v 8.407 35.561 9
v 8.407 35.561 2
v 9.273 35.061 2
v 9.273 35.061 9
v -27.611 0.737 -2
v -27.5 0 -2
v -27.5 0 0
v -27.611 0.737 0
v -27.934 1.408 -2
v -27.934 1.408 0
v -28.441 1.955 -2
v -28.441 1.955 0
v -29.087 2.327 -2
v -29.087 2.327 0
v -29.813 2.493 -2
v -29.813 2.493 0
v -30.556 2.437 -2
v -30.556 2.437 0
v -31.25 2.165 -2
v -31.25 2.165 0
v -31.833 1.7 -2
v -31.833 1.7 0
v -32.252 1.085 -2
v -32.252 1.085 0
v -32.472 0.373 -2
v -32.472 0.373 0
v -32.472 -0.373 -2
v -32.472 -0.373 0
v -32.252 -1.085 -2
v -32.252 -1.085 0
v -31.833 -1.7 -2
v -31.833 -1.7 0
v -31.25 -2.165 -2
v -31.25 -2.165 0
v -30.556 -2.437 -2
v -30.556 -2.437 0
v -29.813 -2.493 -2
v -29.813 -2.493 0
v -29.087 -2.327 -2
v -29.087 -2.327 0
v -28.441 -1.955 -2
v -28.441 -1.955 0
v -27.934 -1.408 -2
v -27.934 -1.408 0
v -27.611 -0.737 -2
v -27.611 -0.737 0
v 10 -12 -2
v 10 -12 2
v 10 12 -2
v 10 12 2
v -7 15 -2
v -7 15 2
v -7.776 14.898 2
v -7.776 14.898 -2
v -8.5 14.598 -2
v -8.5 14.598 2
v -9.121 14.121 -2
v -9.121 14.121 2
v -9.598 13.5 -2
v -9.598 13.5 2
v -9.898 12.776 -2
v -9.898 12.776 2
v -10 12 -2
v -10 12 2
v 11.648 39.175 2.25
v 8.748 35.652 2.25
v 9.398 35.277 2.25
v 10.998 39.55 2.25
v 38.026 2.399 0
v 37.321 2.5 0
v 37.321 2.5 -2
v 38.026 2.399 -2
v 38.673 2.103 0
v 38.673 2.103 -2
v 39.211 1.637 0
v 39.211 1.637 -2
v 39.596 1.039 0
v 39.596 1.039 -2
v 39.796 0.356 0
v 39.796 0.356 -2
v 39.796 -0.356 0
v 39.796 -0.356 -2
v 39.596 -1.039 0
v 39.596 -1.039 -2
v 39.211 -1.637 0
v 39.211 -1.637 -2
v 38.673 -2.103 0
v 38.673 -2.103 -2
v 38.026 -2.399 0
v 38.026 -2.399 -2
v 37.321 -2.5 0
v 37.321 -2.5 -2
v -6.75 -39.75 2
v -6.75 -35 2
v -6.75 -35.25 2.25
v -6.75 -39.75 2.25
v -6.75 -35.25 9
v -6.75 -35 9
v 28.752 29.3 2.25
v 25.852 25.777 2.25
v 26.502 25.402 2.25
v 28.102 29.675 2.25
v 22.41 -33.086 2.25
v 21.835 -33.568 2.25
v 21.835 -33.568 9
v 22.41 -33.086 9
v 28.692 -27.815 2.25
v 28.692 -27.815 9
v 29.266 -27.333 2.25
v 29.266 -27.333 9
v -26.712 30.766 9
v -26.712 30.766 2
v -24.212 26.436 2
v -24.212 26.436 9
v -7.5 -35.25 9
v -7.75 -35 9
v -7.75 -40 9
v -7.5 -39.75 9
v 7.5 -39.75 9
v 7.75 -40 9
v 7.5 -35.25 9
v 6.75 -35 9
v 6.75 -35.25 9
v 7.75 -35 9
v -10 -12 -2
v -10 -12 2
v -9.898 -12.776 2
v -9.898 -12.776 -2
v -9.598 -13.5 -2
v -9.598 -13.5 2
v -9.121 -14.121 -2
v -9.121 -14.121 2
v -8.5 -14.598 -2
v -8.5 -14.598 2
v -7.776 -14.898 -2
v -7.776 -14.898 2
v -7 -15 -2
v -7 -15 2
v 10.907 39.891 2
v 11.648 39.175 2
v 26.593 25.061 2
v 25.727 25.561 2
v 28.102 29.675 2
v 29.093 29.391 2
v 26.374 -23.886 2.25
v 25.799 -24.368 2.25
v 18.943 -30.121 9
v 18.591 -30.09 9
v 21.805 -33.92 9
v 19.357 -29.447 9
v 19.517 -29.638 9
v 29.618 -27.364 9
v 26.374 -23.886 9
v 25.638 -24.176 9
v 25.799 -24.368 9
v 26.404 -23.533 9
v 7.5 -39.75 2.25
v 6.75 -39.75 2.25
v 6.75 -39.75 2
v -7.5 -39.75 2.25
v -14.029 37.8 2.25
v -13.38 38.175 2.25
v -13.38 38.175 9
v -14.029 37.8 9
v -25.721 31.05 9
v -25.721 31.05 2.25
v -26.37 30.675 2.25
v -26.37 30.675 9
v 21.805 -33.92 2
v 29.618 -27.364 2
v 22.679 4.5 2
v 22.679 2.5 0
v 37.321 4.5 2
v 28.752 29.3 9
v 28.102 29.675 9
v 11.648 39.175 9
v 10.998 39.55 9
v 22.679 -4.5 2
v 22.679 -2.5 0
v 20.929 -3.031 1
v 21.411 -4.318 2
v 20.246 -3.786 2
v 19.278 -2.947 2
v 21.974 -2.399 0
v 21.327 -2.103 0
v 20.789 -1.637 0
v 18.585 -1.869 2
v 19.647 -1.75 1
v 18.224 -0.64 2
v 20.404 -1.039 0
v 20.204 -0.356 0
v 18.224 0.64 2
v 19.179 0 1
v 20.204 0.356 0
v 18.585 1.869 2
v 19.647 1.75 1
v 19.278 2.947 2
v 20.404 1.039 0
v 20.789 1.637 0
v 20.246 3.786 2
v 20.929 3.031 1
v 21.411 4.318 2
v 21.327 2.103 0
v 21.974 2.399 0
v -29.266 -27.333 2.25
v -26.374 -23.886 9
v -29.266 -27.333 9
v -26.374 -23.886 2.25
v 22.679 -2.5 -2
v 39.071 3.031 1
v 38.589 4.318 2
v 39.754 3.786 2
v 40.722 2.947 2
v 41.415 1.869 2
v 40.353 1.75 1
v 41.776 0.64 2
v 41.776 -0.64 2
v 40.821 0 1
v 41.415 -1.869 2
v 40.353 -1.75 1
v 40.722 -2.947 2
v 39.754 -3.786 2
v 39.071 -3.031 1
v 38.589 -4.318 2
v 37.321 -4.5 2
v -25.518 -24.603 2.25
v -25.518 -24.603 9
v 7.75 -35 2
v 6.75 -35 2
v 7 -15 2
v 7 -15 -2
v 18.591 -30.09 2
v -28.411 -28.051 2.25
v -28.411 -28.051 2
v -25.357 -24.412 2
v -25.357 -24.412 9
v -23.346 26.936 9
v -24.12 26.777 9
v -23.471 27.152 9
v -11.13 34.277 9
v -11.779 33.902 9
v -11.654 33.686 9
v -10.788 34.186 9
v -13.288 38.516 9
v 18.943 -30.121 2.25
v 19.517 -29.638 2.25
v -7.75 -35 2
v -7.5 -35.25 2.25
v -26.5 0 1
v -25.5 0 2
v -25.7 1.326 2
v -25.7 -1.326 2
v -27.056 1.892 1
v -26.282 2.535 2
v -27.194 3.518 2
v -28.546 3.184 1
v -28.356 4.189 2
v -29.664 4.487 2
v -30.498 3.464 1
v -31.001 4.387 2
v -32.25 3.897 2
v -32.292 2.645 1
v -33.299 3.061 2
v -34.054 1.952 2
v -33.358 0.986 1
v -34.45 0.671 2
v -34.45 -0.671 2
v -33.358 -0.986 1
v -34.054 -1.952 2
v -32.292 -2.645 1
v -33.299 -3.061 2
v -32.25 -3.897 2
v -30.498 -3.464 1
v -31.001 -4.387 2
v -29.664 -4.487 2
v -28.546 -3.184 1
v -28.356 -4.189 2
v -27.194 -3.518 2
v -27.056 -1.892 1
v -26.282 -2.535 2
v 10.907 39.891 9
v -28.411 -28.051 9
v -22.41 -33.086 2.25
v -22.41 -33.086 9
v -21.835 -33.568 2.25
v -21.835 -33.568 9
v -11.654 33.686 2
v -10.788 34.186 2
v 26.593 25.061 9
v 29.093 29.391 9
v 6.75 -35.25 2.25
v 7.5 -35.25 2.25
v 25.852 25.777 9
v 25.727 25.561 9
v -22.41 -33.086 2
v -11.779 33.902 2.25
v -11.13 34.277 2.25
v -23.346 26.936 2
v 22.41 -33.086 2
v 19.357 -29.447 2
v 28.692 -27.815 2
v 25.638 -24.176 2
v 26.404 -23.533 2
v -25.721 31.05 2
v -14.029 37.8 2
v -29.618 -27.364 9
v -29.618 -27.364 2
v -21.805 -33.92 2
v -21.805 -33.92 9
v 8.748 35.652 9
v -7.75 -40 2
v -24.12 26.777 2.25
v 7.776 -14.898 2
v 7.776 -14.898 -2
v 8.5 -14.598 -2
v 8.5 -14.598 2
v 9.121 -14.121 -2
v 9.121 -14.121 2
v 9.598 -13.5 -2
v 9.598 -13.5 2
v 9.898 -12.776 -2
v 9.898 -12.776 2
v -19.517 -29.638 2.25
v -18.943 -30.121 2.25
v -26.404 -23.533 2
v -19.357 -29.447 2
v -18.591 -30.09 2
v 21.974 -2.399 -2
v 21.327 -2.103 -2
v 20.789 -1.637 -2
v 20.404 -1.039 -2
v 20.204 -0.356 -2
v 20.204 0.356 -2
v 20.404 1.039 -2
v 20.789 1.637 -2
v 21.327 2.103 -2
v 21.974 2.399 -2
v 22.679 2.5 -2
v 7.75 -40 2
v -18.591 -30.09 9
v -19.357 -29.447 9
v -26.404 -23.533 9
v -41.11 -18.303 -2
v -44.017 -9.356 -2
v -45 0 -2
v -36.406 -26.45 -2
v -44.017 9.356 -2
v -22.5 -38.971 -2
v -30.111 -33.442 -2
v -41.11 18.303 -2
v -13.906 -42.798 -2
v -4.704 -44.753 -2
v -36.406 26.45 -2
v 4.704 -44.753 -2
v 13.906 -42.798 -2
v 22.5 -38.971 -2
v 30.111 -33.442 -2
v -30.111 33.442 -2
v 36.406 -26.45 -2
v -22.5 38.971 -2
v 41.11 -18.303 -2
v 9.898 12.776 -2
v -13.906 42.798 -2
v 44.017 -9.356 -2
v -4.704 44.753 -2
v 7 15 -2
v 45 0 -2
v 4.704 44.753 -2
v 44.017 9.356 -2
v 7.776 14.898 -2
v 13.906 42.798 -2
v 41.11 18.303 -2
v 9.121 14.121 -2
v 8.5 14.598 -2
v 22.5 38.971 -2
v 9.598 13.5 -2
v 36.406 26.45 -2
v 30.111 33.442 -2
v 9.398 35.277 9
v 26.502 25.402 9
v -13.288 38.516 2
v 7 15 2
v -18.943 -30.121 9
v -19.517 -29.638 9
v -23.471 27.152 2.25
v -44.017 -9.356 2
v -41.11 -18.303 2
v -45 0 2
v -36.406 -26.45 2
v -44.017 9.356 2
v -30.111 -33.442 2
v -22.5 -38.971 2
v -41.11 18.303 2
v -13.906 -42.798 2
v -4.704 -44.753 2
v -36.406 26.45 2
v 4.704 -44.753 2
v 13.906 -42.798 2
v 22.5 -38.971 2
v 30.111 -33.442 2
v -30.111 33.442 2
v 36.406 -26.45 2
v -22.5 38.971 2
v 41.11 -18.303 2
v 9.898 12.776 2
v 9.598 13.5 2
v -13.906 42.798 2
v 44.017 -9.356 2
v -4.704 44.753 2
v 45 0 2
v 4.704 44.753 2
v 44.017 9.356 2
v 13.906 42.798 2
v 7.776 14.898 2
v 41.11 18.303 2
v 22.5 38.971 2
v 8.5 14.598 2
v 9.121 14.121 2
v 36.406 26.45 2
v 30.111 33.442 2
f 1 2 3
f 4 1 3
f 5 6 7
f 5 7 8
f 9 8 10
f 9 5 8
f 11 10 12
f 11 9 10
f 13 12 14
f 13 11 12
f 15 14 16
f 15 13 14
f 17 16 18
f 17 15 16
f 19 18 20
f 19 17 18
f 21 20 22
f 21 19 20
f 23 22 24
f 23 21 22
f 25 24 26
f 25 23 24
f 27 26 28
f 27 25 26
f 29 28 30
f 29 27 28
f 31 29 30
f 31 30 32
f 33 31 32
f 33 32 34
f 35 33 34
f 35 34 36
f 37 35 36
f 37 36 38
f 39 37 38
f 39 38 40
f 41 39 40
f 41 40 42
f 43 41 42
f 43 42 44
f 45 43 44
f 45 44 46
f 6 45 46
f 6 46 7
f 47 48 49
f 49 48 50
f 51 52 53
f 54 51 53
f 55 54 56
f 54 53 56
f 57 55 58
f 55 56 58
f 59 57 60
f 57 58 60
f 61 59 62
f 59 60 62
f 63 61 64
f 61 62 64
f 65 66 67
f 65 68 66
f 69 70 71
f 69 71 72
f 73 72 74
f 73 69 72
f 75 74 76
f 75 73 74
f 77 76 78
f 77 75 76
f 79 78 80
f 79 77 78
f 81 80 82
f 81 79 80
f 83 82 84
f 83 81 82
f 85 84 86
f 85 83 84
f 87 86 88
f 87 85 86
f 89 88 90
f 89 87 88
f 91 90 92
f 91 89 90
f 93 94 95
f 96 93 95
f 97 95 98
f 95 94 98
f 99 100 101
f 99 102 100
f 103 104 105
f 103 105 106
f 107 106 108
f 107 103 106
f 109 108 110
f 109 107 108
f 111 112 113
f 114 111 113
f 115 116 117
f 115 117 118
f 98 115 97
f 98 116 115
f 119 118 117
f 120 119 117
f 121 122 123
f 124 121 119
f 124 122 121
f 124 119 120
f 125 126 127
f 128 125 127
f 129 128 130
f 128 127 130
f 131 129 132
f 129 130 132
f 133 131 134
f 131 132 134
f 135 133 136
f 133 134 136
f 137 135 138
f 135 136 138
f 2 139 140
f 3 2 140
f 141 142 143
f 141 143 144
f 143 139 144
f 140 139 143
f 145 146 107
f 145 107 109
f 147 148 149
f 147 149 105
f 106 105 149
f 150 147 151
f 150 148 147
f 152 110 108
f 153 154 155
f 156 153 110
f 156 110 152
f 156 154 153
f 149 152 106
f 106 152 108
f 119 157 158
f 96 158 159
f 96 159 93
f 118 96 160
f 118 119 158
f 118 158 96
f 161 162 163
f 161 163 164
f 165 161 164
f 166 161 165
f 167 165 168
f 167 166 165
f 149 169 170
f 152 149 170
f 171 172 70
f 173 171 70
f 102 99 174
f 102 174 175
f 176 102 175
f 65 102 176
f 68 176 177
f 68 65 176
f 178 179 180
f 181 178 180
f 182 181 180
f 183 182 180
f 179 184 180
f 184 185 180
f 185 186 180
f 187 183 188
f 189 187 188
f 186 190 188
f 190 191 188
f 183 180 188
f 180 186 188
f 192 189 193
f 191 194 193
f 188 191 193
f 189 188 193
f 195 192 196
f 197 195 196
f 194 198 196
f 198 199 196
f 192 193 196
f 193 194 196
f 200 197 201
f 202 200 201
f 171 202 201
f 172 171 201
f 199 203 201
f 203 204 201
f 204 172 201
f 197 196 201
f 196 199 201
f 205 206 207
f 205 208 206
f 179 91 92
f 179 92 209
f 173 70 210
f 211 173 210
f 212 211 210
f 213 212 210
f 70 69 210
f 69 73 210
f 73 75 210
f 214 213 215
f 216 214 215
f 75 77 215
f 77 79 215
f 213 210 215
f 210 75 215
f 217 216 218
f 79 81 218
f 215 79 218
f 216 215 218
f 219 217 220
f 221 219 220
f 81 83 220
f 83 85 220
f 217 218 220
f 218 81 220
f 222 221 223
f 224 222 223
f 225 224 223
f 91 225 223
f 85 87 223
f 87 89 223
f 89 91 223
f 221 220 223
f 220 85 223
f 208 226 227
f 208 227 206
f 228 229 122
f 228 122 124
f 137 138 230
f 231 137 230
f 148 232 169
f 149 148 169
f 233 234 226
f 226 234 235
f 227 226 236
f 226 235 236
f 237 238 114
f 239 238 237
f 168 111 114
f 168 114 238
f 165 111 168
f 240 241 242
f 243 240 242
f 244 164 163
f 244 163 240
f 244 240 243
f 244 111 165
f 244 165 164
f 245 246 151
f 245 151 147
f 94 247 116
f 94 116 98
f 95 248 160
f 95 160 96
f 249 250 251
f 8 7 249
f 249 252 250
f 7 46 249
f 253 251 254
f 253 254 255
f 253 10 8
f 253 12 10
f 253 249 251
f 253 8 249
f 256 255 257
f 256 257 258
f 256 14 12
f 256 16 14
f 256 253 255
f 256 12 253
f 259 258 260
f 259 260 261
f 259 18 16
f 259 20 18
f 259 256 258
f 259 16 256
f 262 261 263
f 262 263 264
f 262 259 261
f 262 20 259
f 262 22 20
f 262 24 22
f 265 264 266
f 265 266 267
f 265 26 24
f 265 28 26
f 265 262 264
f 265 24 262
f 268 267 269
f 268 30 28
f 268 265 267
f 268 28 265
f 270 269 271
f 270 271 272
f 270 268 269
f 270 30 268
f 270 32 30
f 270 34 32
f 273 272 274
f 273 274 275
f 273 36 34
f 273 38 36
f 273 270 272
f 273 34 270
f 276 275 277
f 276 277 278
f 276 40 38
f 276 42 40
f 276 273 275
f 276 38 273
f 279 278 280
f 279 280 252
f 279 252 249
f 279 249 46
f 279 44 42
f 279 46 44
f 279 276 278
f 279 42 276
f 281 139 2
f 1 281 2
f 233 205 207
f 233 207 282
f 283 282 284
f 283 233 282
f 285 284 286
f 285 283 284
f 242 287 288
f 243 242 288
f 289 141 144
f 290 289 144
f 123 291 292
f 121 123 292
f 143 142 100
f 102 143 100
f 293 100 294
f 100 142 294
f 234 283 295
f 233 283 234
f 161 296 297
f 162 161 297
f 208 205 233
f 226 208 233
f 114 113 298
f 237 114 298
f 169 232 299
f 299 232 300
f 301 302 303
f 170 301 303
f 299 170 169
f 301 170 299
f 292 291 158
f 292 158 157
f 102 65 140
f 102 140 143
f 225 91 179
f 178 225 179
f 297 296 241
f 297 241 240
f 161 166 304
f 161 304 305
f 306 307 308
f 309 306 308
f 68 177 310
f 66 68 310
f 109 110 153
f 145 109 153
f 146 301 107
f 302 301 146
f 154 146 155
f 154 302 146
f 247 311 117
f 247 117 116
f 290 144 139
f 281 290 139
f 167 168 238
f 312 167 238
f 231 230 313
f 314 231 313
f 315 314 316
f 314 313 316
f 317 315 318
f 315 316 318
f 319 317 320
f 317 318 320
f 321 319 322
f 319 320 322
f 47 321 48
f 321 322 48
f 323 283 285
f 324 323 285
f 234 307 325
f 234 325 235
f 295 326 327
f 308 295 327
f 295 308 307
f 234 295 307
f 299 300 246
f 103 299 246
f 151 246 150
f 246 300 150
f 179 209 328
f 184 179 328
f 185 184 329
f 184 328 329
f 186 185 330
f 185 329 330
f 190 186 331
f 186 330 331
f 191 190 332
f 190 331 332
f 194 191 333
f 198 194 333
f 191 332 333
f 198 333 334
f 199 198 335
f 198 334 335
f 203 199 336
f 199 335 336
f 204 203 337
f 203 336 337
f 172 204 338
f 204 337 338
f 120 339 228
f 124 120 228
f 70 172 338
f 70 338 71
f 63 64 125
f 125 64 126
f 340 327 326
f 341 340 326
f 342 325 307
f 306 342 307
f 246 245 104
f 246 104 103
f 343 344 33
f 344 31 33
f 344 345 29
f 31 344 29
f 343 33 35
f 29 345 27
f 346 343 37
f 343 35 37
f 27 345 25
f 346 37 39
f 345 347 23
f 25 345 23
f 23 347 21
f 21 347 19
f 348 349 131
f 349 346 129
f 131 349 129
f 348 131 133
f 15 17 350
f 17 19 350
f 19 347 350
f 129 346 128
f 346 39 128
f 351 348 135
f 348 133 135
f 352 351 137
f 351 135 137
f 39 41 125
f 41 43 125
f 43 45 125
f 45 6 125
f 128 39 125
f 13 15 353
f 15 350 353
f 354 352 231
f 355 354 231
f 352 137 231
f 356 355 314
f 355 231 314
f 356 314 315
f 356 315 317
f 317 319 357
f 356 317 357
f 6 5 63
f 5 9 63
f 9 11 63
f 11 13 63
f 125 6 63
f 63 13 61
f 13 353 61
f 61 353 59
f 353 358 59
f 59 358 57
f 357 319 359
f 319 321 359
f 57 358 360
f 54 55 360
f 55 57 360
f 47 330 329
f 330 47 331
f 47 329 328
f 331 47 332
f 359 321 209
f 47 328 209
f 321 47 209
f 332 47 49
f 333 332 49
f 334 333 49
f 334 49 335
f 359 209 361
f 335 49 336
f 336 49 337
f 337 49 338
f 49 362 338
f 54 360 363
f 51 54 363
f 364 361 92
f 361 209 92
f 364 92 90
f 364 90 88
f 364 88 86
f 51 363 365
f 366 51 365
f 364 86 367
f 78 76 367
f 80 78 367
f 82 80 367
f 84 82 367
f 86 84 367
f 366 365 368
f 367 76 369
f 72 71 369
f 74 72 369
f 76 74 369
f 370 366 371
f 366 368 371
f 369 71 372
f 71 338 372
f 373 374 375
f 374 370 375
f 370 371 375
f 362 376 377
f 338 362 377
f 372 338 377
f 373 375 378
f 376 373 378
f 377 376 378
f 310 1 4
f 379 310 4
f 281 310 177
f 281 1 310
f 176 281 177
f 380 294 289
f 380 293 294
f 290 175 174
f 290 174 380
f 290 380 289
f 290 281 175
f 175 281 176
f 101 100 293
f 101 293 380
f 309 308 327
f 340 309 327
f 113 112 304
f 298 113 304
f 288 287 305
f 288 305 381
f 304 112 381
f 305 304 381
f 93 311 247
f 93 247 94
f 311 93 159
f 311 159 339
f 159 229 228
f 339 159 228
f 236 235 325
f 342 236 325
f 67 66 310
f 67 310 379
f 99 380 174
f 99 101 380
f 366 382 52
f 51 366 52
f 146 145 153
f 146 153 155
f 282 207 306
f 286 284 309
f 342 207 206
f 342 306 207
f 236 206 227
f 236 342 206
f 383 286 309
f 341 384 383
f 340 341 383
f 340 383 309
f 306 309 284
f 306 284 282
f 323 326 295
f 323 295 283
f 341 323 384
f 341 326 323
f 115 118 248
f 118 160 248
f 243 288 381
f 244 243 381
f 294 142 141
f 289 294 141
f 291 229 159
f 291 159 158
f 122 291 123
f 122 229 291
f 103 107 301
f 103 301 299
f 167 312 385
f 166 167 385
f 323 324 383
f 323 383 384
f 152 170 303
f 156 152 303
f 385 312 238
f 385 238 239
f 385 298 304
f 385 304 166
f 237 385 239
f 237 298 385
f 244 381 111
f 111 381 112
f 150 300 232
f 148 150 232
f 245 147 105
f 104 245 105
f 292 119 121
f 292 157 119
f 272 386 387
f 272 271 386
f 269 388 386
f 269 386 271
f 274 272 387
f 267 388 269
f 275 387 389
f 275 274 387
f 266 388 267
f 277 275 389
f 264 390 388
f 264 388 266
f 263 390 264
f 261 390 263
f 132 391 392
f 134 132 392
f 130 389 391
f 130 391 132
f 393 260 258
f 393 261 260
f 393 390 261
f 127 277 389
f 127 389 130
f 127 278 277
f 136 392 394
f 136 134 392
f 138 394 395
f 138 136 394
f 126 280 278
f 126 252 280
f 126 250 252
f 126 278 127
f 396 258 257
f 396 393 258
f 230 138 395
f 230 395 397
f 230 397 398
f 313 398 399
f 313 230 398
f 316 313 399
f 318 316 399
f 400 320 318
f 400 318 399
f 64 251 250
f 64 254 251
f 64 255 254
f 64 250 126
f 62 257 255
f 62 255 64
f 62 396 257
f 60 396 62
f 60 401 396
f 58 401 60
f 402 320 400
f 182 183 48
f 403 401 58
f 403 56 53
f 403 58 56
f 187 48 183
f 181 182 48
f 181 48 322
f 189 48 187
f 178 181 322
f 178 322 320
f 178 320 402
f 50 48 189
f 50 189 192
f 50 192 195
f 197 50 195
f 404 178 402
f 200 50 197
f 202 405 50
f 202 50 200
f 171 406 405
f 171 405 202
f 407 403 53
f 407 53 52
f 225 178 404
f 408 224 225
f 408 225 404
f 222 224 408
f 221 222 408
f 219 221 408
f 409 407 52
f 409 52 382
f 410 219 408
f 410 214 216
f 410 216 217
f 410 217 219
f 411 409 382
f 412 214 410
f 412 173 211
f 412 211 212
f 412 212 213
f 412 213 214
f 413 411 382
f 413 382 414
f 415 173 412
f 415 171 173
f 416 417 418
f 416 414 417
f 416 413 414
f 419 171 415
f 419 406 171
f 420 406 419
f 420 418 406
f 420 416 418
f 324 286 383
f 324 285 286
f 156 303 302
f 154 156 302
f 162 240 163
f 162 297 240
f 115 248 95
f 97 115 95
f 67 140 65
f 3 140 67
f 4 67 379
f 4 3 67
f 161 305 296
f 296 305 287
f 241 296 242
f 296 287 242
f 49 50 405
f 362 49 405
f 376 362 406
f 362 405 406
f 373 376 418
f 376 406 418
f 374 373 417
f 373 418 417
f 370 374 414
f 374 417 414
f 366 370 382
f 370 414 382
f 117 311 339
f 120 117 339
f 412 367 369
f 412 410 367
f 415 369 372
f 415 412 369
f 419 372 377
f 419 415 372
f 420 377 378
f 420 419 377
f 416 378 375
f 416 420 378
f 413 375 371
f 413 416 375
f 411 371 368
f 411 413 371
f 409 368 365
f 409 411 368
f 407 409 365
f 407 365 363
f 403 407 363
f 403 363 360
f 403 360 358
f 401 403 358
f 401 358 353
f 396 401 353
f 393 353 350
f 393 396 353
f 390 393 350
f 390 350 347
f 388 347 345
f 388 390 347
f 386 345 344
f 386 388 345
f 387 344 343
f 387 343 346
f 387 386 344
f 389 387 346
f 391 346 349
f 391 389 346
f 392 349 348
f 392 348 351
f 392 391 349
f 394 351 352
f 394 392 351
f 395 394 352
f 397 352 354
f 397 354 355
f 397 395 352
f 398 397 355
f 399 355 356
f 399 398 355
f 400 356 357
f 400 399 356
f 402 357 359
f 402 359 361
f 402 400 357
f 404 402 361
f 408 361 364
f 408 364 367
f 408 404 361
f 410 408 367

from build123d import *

# Parameters (mm, degrees)
F0_R      = 45
F0_R_2    = 2.5
F1_DEPTH  = 2
F2_SIZE2  = 2
F2_SIZE   = 2
F3_SIZE2  = 2
F3_SIZE   = 2
F9_DEPTH  = 7
F6_W      = 15.5
F6_H      = 5
F10_T     = -0.25
F10_2_T   = -0.25
F10_3_T   = -0.25
F10_4_T   = -0.25
F10_5_T   = -0.25
F11_W     = 13.5
F11_H     = 7
F12_DEPTH = 4.75
F13_W     = 19
F13_H     = 7
F14_DEPTH = 4.75
F15_W     = 8.2
F15_H     = 7
F16_DEPTH = 4.75
F17_W     = 13.5
F17_H     = 7
F18_DEPTH = 4.75
F19_W     = 7.8331888452
F19_H     = 7
F20_DEPTH = 4.75
F22_DEPTH = 4.001


with BuildPart() as f1:
    # F0 (on Top) → F1 (new body, symmetric)
    with BuildSketch(Plane.XY):
        Circle(F0_R)
        with Locations((-30, 0)):
            Circle(F0_R_2, mode=Mode.SUBTRACT)
        with BuildLine():
            ThreePointArc((22.6785261184, -2.5), (20.1785261184, 0), (22.6785261184, 2.5))
            Line((22.6785261184, 2.5), (37.3214738816, 2.5))
            ThreePointArc((37.3214738816, 2.5), (39.8214738816, 0), (37.3214738816, -2.5))
            Line((37.3214738816, -2.5), (22.6785261184, -2.5))
        make_face(mode=Mode.SUBTRACT)
    extrude(amount=F1_DEPTH, both=True)

    # F2
    f2_edges = [f1.edges().sort_by_distance(p)[0] for p in [
        (-32.5, 0, 2),
    ]]
    chamfer(f2_edges, length=F2_SIZE, length2=F2_SIZE2)

    # F3
    f3_edges = [f1.edges().sort_by_distance(p)[0] for p in [
        (20.178526, 0, 2),
    ]]
    chamfer(f3_edges, length=F3_SIZE, length2=F3_SIZE2)

    # F21 (on face) → F22 (cut, through all)
    with BuildSketch(Plane.XY.offset(2)):
        with BuildLine():
            Line((7, 15), (-7, 15))
            ThreePointArc((-7, 15), (-9.1213203436, 14.1213203436), (-10, 12))
            Line((-10, 12), (-10, -12))
            ThreePointArc((-10, -12), (-9.1213203436, -14.1213203436), (-7, -15))
            Line((-7, -15), (7, -15))
            ThreePointArc((7, -15), (9.1213203436, -14.1213203436), (10, -12))
            Line((10, -12), (10, 12))
            ThreePointArc((10, 12), (9.1213203436, 14.1213203436), (7, 15))
        make_face()
    extrude(amount=-F22_DEPTH, mode=Mode.SUBTRACT)


with BuildPart() as f9:
    # F4 (on face) → F9 (new body)
    with BuildSketch(Plane.XY.offset(2)):
        Polygon((26.5932667397, 25.0608891325), (29.0932667397, 29.3910161514), (10.9067332603, 39.8910161514), (8.4067332603, 35.5608891325), align=None)
    extrude(amount=F9_DEPTH)

    # F10#2
    f10_2_openings = [f9.faces().sort_by_distance(p)[0] for p in [
        (18.75, 32.475953, 9),
    ]]
    offset(amount=F10_2_T, openings=f10_2_openings)

    # F13 (on face) → F14 (cut, through all)
    with BuildSketch(Plane(origin=(17.5, 30.3108891325, 0), x_dir=(0.8660254038, -0.5, 0), z_dir=(-0.5, -0.8660254038, 0))):
        with Locations((0, 5.5)):
            Rectangle(F13_W, F13_H)
    extrude(amount=-F14_DEPTH, mode=Mode.SUBTRACT)


with BuildPart() as f9b:
    # F5 (on face) → F9, piece 2 (new body)
    with BuildSketch(Plane.XY.offset(2)):
        Polygon((-10.7883031207, 34.1858891325), (-13.2883031207, 38.5160161514), (-26.7116968793, 30.7660161514), (-24.2116968793, 26.4358891325), align=None)
    extrude(amount=F9_DEPTH)

    # F10
    f10_openings = [f9b.faces().sort_by_distance(p)[0] for p in [
        (-18.75, 32.475953, 9),
    ]]
    offset(amount=F10_T, openings=f10_openings)

    # F11 (on face) → F12 (cut, through all)
    with BuildSketch(Plane(origin=(-17.5, 30.3108891325, 0), x_dir=(0.8660254038, 0.5, 0), z_dir=(0.5, -0.8660254038, 0))):
        with Locations((0, 5.5)):
            Rectangle(F11_W, F11_H)
    extrude(amount=-F12_DEPTH, mode=Mode.SUBTRACT)


with BuildPart() as f9c:
    # F6 (on face) → F9, piece 3 (new body)
    with BuildSketch(Plane.XY.offset(2)):
        with Locations((0, -37.5)):
            Rectangle(F6_W, F6_H)
    extrude(amount=F9_DEPTH)

    # F10#4
    f10_4_openings = [f9c.faces().sort_by_distance(p)[0] for p in [
        (0, -37.5, 9),
    ]]
    offset(amount=F10_4_T, openings=f10_4_openings)

    # F17 (on face) → F18 (cut, through all)
    with BuildSketch(Plane(origin=(0, -35, 0), x_dir=(-1, 0, 0), z_dir=(0, 1, 0))):
        with Locations((0, 5.5)):
            Rectangle(F17_W, F17_H)
    extrude(amount=-F18_DEPTH, mode=Mode.SUBTRACT)


with BuildPart() as f9d:
    # F7 (on face) → F9, piece 4 (new body)
    with BuildSketch(Plane.XY.offset(2)):
        Polygon((-26.4043929989, -23.5333386998), (-29.6183310474, -27.3635609154), (-21.8046777276, -33.9199945342), (-18.5907396791, -30.0897723186), align=None)
    extrude(amount=F9_DEPTH)

    # F10#5
    f10_5_openings = [f9d.faces().sort_by_distance(p)[0] for p in [
        (-24.104535, -28.726667, 9),
    ]]
    offset(amount=F10_5_T, openings=f10_5_openings)

    # F19 (on face) → F20 (cut, through all)
    with BuildSketch(Plane(origin=(-22.497566339, -26.8115555092, 0), x_dir=(-0.7660444431, 0.6427876097, 0), z_dir=(0.6427876097, 0.7660444431, 0))):
        with Locations((-0.1834055774, 5.5)):
            Rectangle(F19_W, F19_H)
    extrude(amount=-F20_DEPTH, mode=Mode.SUBTRACT)


with BuildPart() as f9e:
    # F8 (on face) → F9, piece 5 (new body)
    with BuildSketch(Plane.XY.offset(2)):
        Polygon((18.5907396791, -30.0897723186), (21.8046777276, -33.9199945342), (29.6183310474, -27.3635609154), (26.4043929989, -23.5333386998), align=None)
    extrude(amount=F9_DEPTH)

    # F10#3
    f10_3_openings = [f9e.faces().sort_by_distance(p)[0] for p in [
        (24.104535, -28.726667, 9),
    ]]
    offset(amount=F10_3_T, openings=f10_3_openings)

    # F15 (on face) → F16 (cut, through all)
    with BuildSketch(Plane(origin=(22.497566339, -26.8115555092, 0), x_dir=(-0.7660444431, -0.6427876097, 0), z_dir=(-0.6427876097, 0.7660444431, 0))):
        with Locations((0, 5.5)):
            Rectangle(F15_W, F15_H)
    extrude(amount=-F16_DEPTH, mode=Mode.SUBTRACT)


solid = Compound([f1.part, f9.part, f9b.part, f9c.part, f9d.part, f9e.part])
